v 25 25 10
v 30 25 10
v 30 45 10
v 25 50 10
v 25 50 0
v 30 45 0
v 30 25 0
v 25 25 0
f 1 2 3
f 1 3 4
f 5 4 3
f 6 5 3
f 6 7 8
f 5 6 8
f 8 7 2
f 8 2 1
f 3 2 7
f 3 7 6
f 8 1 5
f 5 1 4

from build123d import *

# Parameters (mm, degrees)
SKETCH002_W  = 170.028106
SKETCH002_H  = 154.781021
PAD002_DEPTH = 30
SKETCH001_W  = 178.926751
SKETCH001_H  = 164.552085
PAD_DEPTH    = 25
PAD001_DEPTH = 10


with BuildPart() as pad002:
    # Sketch002 → Pad002 (new body)
    with BuildSketch(Plane.YZ):
        with Locations((0.462036, 0.231018)):
            Rectangle(SKETCH002_W, SKETCH002_H)
    extrude(amount=PAD002_DEPTH)


with BuildPart() as pad:
    # Sketch001 → Pad (new body)
    with BuildSketch(Plane.YZ):
        with Locations((1.16814, -0.450252)):
            Rectangle(SKETCH001_W, SKETCH001_H)
    extrude(amount=PAD_DEPTH)


with BuildPart() as common:
    # Sketch → Pad001 (new body)
    with BuildSketch(Plane.XY):
        Polygon((0, 25), (0, 75), (50, 25), align=None)
    extrude(amount=PAD001_DEPTH)

    # Cut: cut Pad
    add(pad.part, mode=Mode.SUBTRACT)

    # Common: intersect Pad002
    add(pad002.part, mode=Mode.INTERSECT)


solid = common.part
